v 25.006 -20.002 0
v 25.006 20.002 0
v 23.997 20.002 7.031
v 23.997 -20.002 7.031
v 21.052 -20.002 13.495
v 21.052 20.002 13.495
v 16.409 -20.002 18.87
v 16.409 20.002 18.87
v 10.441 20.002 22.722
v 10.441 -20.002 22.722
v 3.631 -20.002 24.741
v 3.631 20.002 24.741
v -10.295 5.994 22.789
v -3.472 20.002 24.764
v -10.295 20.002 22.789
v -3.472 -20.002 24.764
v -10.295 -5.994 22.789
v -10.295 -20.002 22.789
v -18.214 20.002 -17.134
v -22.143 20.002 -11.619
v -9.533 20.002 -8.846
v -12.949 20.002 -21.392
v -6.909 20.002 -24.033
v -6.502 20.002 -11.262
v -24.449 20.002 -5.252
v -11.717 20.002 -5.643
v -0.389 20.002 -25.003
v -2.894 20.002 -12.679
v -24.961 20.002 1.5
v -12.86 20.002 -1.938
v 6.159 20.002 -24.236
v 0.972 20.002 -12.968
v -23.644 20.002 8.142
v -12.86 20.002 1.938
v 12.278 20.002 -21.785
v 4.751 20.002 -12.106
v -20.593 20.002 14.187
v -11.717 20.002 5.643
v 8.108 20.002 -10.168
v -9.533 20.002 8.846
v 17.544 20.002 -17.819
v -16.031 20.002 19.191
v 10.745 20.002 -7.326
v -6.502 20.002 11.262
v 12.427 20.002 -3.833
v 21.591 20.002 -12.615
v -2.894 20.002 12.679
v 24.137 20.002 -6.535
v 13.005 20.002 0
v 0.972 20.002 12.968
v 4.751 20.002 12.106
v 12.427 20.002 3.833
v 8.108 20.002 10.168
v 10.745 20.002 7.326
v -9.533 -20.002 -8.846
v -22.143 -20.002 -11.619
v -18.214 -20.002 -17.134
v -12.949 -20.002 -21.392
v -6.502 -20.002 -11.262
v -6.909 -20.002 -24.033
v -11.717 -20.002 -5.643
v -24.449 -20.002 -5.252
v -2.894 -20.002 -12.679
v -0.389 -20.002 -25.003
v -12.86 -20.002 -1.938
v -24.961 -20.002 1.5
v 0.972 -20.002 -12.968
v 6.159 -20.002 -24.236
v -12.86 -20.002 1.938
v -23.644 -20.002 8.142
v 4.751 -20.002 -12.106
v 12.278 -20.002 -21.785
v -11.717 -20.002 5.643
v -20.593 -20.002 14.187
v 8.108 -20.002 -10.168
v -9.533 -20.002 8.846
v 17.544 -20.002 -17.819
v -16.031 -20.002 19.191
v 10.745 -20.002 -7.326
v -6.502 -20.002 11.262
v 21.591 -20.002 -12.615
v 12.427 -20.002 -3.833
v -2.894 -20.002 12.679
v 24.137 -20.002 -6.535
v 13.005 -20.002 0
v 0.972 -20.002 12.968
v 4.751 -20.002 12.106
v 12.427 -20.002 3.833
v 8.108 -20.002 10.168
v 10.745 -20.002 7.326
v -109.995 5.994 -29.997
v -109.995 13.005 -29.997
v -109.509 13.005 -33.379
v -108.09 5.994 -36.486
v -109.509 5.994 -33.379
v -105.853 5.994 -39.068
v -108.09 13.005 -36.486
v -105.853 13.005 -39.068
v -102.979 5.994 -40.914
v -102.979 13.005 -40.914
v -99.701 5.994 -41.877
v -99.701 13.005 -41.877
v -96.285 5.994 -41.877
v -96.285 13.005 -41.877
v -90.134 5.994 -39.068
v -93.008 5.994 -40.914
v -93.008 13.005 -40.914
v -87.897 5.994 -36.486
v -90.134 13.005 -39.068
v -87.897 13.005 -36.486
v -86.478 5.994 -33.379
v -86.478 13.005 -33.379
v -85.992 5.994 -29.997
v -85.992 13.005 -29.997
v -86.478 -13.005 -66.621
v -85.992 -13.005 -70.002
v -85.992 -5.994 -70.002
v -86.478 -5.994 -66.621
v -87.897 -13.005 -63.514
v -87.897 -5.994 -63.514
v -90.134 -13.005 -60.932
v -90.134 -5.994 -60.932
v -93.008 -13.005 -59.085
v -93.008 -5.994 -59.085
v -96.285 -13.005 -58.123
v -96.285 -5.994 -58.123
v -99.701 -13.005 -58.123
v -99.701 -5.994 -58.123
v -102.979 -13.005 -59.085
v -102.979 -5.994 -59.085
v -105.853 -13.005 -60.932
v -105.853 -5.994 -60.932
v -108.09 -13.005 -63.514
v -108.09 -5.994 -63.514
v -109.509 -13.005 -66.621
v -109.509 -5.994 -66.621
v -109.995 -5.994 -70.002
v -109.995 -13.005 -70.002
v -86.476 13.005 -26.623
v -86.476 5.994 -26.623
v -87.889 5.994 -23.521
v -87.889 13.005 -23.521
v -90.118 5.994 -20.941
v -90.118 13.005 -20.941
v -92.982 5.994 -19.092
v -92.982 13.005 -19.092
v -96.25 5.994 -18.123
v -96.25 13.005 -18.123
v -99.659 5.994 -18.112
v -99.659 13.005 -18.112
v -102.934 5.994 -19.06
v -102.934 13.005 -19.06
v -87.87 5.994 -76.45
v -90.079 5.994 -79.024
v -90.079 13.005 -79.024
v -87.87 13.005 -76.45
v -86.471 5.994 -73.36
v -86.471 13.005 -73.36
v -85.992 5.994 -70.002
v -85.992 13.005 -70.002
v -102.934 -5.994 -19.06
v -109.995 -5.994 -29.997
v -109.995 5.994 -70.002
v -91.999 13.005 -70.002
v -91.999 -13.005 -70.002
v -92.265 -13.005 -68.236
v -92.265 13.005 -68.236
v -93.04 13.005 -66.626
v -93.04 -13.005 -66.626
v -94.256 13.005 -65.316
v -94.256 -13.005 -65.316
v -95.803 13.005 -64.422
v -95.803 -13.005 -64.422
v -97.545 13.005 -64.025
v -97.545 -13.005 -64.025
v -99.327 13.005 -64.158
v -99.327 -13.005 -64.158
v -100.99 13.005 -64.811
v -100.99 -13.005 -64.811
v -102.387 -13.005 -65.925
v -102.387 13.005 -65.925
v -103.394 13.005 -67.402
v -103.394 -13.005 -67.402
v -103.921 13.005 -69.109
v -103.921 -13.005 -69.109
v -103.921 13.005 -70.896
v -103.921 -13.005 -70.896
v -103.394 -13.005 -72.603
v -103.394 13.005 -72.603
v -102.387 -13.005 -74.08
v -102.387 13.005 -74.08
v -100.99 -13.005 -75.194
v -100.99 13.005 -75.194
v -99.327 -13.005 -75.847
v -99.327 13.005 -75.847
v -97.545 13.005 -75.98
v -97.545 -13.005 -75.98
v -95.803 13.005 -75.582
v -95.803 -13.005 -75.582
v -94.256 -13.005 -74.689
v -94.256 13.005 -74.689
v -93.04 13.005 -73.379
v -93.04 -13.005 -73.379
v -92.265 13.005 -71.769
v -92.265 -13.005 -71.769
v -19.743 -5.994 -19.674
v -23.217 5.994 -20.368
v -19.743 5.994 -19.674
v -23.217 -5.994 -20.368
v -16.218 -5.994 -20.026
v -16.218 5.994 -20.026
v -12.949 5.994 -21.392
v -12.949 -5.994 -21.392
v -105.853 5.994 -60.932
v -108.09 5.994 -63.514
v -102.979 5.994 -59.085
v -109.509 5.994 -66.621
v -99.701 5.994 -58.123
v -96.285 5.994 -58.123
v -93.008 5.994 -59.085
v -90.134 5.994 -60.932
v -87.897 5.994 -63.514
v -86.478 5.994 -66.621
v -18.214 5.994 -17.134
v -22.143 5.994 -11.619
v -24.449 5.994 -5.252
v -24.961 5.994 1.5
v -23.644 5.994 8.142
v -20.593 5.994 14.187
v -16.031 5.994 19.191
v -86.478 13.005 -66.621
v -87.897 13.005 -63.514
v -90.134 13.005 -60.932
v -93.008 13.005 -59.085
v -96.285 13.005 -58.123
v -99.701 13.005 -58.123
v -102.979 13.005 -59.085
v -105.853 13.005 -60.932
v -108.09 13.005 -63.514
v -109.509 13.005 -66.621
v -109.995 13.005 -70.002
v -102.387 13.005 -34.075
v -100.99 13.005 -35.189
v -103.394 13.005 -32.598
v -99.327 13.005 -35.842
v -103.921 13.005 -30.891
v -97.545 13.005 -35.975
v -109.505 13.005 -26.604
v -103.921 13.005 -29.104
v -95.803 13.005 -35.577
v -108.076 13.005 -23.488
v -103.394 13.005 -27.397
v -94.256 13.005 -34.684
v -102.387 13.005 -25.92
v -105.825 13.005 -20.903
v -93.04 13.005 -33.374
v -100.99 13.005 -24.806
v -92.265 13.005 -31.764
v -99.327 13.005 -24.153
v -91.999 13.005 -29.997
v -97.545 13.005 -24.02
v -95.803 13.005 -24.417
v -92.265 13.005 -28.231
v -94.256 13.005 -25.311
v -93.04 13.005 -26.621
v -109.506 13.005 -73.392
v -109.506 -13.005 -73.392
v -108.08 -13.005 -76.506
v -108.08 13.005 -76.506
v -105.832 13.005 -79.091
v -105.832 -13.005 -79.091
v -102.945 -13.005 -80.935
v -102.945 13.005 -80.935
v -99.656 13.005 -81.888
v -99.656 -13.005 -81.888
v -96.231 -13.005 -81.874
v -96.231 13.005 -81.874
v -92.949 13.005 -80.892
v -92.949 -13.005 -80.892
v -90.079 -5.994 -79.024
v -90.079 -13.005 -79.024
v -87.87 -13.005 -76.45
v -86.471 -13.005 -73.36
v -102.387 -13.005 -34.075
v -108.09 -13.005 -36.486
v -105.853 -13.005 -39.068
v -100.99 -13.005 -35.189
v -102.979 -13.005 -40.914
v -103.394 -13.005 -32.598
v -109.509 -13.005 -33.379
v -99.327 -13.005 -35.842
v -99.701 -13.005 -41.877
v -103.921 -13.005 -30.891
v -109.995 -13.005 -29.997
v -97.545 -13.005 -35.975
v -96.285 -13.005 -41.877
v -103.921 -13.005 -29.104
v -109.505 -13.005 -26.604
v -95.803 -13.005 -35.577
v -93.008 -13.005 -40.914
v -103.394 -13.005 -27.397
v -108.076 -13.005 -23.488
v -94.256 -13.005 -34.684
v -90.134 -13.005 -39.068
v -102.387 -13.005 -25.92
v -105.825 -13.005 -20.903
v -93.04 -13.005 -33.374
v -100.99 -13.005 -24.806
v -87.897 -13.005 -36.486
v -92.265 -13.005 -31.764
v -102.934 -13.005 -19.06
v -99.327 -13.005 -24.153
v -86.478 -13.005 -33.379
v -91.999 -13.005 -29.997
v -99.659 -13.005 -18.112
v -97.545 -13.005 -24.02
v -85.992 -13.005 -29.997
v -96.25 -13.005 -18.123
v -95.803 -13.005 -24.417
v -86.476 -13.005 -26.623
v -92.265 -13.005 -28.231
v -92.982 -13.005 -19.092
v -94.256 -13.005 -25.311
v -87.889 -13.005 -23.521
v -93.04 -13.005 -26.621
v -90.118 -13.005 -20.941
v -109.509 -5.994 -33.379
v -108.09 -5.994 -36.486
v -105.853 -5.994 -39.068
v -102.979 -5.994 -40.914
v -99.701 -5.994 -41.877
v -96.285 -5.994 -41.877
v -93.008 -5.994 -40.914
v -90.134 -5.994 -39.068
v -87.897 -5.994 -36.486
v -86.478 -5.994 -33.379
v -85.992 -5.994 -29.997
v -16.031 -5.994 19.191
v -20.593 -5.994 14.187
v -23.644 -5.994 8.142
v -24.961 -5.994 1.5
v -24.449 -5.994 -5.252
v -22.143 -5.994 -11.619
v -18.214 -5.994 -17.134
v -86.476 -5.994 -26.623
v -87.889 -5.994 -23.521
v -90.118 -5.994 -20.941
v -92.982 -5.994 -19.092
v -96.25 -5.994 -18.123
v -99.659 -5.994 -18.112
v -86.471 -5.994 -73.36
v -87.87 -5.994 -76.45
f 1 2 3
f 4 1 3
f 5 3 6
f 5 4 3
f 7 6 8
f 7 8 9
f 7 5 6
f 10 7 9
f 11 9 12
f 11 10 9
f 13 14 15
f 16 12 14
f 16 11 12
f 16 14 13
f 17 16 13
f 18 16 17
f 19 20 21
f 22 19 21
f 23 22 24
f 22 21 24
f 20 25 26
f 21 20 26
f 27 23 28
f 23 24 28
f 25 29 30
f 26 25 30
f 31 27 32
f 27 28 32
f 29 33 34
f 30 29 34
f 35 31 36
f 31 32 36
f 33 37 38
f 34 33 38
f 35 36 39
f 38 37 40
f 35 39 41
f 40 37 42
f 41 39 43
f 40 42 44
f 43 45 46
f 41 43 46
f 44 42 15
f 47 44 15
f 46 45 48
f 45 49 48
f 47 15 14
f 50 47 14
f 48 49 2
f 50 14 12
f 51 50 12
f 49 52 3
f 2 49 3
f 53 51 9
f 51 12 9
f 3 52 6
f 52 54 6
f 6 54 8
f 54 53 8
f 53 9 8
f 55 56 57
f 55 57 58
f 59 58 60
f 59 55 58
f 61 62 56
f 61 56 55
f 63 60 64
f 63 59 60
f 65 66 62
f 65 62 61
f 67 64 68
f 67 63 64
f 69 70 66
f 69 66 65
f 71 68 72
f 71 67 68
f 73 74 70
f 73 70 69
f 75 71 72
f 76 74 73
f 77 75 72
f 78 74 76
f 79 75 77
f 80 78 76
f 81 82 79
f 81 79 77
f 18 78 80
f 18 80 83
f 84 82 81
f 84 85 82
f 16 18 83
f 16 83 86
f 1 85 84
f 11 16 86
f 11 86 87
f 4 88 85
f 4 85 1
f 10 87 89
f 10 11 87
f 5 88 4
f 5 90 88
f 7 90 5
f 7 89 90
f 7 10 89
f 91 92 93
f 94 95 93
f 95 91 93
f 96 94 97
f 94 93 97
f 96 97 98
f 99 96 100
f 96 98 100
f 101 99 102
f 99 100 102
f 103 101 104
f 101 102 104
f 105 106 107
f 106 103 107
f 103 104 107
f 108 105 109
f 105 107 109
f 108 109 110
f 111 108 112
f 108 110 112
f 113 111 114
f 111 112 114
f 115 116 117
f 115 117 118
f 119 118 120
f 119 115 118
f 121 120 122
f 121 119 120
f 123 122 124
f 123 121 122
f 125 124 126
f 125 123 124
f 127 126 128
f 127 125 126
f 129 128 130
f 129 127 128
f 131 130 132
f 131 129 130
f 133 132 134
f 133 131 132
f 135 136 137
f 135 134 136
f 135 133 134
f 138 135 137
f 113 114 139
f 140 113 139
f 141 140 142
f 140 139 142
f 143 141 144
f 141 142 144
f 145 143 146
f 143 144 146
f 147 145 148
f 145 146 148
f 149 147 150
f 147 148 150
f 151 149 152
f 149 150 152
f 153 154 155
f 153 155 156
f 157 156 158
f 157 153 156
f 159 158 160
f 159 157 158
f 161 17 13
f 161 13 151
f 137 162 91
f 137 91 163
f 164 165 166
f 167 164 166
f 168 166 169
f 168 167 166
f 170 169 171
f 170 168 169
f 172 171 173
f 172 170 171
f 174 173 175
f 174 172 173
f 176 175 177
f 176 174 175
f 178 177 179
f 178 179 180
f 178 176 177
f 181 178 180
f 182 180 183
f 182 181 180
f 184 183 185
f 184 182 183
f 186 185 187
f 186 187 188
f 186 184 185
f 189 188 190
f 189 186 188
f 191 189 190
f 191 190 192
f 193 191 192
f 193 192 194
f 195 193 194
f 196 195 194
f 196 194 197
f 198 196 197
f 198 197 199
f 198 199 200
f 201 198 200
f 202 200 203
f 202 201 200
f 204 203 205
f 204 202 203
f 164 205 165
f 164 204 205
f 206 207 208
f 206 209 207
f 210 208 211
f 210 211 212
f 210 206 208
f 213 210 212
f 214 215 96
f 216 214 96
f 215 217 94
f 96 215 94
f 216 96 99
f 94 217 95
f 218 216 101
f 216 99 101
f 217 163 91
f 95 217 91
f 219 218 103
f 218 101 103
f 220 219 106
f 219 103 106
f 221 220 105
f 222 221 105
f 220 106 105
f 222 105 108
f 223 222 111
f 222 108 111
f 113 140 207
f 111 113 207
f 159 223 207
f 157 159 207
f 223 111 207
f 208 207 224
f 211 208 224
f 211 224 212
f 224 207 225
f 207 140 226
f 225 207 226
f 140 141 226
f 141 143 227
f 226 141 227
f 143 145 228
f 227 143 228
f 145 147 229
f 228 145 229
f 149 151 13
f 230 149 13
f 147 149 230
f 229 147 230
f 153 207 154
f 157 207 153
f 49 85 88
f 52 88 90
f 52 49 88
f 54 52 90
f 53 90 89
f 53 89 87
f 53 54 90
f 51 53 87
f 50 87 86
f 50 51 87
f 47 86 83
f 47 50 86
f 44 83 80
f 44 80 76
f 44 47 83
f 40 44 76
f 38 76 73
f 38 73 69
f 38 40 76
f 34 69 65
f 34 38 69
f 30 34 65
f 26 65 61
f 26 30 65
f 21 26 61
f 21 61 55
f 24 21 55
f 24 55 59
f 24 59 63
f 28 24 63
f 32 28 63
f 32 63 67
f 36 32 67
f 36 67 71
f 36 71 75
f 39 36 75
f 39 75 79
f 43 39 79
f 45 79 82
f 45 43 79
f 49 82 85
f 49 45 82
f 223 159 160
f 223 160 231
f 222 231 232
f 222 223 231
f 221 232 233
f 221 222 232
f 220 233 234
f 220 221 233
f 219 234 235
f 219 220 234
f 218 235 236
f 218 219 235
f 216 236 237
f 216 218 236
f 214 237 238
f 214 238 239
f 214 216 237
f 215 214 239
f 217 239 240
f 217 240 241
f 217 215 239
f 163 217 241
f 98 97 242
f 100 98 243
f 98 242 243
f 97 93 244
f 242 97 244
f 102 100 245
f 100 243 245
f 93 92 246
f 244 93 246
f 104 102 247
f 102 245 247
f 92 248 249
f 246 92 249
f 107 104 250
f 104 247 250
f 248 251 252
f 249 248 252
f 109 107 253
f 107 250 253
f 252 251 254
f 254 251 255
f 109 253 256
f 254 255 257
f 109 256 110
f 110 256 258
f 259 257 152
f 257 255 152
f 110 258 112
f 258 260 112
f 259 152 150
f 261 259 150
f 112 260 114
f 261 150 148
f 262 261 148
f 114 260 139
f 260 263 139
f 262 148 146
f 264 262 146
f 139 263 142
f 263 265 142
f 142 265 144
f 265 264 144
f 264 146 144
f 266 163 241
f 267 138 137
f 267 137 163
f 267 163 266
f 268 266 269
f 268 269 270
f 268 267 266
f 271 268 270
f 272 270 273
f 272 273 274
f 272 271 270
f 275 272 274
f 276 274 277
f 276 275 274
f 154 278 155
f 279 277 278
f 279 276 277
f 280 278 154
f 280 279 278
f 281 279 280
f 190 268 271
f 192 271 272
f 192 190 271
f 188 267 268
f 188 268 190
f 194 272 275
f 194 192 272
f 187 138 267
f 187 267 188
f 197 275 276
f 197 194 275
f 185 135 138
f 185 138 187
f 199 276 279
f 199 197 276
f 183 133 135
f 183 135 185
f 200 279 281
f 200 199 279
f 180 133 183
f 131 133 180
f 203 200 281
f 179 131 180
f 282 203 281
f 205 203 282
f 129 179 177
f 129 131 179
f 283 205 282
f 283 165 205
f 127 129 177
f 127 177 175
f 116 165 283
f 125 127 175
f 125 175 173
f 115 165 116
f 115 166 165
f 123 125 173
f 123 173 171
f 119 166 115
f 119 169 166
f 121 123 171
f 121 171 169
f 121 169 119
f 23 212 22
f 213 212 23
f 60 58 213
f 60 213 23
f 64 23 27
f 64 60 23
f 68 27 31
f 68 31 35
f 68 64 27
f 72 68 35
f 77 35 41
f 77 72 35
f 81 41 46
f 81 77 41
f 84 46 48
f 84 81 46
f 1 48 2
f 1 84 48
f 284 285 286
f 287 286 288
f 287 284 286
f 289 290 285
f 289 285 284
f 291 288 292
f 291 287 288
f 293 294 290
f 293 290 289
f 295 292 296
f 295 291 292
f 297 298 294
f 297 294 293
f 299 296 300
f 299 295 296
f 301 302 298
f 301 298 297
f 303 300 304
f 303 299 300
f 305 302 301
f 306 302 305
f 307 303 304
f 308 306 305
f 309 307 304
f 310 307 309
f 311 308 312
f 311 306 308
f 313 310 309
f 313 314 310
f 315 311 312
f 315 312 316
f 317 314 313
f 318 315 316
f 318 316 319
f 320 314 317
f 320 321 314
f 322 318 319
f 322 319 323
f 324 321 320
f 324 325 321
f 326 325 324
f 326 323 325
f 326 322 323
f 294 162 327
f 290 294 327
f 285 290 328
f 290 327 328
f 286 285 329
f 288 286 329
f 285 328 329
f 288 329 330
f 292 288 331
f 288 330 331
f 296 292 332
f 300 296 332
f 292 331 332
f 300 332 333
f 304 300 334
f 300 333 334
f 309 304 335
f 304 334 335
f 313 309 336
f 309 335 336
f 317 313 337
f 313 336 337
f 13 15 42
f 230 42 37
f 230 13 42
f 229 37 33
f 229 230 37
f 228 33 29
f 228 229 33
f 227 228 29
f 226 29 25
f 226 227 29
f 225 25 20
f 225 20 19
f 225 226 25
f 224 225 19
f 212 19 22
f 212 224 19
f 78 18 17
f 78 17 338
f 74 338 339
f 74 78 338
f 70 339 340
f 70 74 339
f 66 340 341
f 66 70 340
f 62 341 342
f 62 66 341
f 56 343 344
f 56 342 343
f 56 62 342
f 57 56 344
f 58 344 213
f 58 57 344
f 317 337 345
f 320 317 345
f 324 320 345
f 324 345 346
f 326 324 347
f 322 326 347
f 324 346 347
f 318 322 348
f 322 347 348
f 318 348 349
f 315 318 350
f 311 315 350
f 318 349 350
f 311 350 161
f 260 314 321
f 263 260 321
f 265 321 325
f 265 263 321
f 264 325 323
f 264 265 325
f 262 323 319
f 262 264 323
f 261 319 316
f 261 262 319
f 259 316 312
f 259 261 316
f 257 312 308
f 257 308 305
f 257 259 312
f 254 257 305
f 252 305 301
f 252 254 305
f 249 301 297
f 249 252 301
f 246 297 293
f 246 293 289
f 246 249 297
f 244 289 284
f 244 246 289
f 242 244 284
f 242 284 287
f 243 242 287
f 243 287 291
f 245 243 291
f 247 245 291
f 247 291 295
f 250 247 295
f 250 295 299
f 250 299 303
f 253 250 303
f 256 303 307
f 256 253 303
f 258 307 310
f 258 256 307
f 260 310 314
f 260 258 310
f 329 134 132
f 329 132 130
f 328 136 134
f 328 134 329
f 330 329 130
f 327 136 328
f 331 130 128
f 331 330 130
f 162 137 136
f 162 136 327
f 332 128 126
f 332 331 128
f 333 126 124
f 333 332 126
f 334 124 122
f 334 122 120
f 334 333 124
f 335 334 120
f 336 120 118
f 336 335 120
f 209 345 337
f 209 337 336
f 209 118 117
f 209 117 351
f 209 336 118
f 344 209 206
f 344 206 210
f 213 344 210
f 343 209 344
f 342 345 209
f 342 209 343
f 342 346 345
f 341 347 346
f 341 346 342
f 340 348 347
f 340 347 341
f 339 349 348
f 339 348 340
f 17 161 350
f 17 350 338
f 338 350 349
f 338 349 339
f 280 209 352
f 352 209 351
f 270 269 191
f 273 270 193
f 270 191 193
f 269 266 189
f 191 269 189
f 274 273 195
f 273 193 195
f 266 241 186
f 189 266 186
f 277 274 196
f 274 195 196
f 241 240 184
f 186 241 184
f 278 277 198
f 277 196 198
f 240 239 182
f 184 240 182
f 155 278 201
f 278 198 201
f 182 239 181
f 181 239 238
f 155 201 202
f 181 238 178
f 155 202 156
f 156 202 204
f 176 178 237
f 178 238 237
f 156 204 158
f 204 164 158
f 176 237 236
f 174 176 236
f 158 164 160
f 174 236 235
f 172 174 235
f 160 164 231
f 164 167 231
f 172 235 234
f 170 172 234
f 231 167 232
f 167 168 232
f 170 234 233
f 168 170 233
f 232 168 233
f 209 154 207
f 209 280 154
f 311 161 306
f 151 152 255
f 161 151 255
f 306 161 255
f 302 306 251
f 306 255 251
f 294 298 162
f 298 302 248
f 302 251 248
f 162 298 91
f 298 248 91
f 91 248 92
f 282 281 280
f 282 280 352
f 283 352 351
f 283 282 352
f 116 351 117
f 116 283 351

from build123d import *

# Parameters (mm, degrees)
F0_R     = 13.0048
F1_DEPTH = 20.0025
F2_DEPTH = 5.9944
F0_R_2   = 5.9944
F3_DEPTH = 13.0048


with BuildPart() as f1:
    # F0 (on Front) → F1 (new body, symmetric)
    with BuildSketch(Plane.XZ):
        with BuildLine():
            ThreePointArc((-12.949346, -21.392276), (12.278025, -21.784516), (25.0063, 0))
            ThreePointArc((25.0063, 0), (13.562501, 21.008894), (-10.294693, 22.788908))
            ThreePointArc((-10.294693, 22.788908), (-24.961282, 1.499814), (-12.949346, -21.392276))
        make_face()
        Circle(F0_R, mode=Mode.SUBTRACT)
    extrude(amount=F1_DEPTH, both=True)

    # F0 (on Front) → F2 (join, symmetric)
    with BuildSketch(Plane.XZ):
        with BuildLine():
            ThreePointArc((-12.949346, -21.392276), (-24.961282, 1.499814), (-10.294693, 22.788908))
            Line((-10.294693, 22.788908), (-102.934025, -19.060113))
            ThreePointArc((-102.934025, -19.060113), (-91.484026, -19.914411), (-85.9917, -29.9974))
            ThreePointArc((-85.9917, -29.9974), (-97.9932, -41.9989), (-109.9947, -29.9974))
            Line((-109.9947, -29.9974), (-109.9947, -70.0024))
            ThreePointArc((-109.9947, -70.0024), (-97.9932, -58.0009), (-85.9917, -70.0024))
            ThreePointArc((-85.9917, -70.0024), (-87.06104, -74.95456), (-90.078504, -79.024239))
            Line((-90.078504, -79.024239), (-23.216794, -20.367672))
            ThreePointArc((-23.216794, -20.367672), (-17.9672, -19.718852), (-12.949346, -21.392276))
        make_face()
    extrude(amount=F2_DEPTH, both=True)

    # F0 (on Front) → F3 (join, symmetric)
    with BuildSketch(Plane.XZ):
        with BuildLine():
            ThreePointArc((-85.9917, -29.9974), (-91.484026, -19.914411), (-102.934025, -19.060113))
            ThreePointArc((-102.934025, -19.060113), (-108.076189, -23.488226), (-109.9947, -29.9974))
            ThreePointArc((-109.9947, -29.9974), (-97.9932, -41.9989), (-85.9917, -29.9974))
        make_face()
        with Locations((-97.9932, -29.9974)):
            Circle(F0_R_2, mode=Mode.SUBTRACT)
        with BuildLine():
            ThreePointArc((-109.9947, -70.0024), (-102.94536, -80.93456), (-90.078504, -79.024239))
            ThreePointArc((-90.078504, -79.024239), (-87.06104, -74.95456), (-85.9917, -70.0024))
            ThreePointArc((-85.9917, -70.0024), (-97.9932, -58.0009), (-109.9947, -70.0024))
        make_face()
        with Locations((-97.9932, -70.0024)):
            Circle(F0_R_2, mode=Mode.SUBTRACT)
    extrude(amount=F3_DEPTH, both=True)


solid = f1.part
